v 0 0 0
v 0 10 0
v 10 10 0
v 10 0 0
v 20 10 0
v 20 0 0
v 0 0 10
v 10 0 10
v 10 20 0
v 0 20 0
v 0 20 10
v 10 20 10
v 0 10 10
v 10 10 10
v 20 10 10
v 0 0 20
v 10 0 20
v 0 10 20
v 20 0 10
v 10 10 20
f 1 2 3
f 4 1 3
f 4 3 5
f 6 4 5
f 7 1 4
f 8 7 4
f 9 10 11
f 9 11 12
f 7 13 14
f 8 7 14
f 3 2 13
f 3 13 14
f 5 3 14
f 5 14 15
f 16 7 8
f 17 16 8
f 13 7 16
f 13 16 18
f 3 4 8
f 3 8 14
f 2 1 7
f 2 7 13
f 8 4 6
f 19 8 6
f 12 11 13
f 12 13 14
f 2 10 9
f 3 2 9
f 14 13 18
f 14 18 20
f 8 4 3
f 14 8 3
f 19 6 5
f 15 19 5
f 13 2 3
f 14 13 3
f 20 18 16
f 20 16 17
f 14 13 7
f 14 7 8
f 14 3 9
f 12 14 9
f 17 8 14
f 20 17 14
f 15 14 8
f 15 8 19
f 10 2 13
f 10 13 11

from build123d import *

# Parameters (mm, degrees)
BOX_W        = 10
BOX_H        = 10
BOX_DEPTH    = 10
BOX001_W     = 10
BOX001_H     = 10
BOX001_DEPTH = 10
BOX002_W     = 10
BOX002_H     = 10
BOX002_DEPTH = 10
BOX003_W     = 10
BOX003_H     = 10
BOX003_DEPTH = 10


with BuildPart() as nivel1_cubo1:
    # Box → Box (new body)
    with BuildSketch(Plane.XY):
        with Locations((5, 5)):
            Rectangle(BOX_W, BOX_H)
    extrude(amount=BOX_DEPTH)


with BuildPart() as nivel2_cubo1:
    # Box001 → Box001 (new body)
    with BuildSketch(Plane(origin=(10, 0, 0), x_dir=(1, 0, 0), z_dir=(0, 0, 1))):
        with Locations((5, 5)):
            Rectangle(BOX001_W, BOX001_H)
    extrude(amount=BOX001_DEPTH)


with BuildPart() as nivel2_cubo2:
    # Box002 → Box002 (new body)
    with BuildSketch(Plane(origin=(0, 10, 0), x_dir=(1, 0, 0), z_dir=(0, 0, 1))):
        with Locations((5, 5)):
            Rectangle(BOX002_W, BOX002_H)
    extrude(amount=BOX002_DEPTH)


with BuildPart() as cub:
    # Box003 → Box003 (new body)
    with BuildSketch(Plane.XY.offset(10)):
        with Locations((5, 5)):
            Rectangle(BOX003_W, BOX003_H)
    extrude(amount=BOX003_DEPTH)


solid = Compound([nivel1_cubo1.part, nivel2_cubo1.part, nivel2_cubo2.part, cub.part])
